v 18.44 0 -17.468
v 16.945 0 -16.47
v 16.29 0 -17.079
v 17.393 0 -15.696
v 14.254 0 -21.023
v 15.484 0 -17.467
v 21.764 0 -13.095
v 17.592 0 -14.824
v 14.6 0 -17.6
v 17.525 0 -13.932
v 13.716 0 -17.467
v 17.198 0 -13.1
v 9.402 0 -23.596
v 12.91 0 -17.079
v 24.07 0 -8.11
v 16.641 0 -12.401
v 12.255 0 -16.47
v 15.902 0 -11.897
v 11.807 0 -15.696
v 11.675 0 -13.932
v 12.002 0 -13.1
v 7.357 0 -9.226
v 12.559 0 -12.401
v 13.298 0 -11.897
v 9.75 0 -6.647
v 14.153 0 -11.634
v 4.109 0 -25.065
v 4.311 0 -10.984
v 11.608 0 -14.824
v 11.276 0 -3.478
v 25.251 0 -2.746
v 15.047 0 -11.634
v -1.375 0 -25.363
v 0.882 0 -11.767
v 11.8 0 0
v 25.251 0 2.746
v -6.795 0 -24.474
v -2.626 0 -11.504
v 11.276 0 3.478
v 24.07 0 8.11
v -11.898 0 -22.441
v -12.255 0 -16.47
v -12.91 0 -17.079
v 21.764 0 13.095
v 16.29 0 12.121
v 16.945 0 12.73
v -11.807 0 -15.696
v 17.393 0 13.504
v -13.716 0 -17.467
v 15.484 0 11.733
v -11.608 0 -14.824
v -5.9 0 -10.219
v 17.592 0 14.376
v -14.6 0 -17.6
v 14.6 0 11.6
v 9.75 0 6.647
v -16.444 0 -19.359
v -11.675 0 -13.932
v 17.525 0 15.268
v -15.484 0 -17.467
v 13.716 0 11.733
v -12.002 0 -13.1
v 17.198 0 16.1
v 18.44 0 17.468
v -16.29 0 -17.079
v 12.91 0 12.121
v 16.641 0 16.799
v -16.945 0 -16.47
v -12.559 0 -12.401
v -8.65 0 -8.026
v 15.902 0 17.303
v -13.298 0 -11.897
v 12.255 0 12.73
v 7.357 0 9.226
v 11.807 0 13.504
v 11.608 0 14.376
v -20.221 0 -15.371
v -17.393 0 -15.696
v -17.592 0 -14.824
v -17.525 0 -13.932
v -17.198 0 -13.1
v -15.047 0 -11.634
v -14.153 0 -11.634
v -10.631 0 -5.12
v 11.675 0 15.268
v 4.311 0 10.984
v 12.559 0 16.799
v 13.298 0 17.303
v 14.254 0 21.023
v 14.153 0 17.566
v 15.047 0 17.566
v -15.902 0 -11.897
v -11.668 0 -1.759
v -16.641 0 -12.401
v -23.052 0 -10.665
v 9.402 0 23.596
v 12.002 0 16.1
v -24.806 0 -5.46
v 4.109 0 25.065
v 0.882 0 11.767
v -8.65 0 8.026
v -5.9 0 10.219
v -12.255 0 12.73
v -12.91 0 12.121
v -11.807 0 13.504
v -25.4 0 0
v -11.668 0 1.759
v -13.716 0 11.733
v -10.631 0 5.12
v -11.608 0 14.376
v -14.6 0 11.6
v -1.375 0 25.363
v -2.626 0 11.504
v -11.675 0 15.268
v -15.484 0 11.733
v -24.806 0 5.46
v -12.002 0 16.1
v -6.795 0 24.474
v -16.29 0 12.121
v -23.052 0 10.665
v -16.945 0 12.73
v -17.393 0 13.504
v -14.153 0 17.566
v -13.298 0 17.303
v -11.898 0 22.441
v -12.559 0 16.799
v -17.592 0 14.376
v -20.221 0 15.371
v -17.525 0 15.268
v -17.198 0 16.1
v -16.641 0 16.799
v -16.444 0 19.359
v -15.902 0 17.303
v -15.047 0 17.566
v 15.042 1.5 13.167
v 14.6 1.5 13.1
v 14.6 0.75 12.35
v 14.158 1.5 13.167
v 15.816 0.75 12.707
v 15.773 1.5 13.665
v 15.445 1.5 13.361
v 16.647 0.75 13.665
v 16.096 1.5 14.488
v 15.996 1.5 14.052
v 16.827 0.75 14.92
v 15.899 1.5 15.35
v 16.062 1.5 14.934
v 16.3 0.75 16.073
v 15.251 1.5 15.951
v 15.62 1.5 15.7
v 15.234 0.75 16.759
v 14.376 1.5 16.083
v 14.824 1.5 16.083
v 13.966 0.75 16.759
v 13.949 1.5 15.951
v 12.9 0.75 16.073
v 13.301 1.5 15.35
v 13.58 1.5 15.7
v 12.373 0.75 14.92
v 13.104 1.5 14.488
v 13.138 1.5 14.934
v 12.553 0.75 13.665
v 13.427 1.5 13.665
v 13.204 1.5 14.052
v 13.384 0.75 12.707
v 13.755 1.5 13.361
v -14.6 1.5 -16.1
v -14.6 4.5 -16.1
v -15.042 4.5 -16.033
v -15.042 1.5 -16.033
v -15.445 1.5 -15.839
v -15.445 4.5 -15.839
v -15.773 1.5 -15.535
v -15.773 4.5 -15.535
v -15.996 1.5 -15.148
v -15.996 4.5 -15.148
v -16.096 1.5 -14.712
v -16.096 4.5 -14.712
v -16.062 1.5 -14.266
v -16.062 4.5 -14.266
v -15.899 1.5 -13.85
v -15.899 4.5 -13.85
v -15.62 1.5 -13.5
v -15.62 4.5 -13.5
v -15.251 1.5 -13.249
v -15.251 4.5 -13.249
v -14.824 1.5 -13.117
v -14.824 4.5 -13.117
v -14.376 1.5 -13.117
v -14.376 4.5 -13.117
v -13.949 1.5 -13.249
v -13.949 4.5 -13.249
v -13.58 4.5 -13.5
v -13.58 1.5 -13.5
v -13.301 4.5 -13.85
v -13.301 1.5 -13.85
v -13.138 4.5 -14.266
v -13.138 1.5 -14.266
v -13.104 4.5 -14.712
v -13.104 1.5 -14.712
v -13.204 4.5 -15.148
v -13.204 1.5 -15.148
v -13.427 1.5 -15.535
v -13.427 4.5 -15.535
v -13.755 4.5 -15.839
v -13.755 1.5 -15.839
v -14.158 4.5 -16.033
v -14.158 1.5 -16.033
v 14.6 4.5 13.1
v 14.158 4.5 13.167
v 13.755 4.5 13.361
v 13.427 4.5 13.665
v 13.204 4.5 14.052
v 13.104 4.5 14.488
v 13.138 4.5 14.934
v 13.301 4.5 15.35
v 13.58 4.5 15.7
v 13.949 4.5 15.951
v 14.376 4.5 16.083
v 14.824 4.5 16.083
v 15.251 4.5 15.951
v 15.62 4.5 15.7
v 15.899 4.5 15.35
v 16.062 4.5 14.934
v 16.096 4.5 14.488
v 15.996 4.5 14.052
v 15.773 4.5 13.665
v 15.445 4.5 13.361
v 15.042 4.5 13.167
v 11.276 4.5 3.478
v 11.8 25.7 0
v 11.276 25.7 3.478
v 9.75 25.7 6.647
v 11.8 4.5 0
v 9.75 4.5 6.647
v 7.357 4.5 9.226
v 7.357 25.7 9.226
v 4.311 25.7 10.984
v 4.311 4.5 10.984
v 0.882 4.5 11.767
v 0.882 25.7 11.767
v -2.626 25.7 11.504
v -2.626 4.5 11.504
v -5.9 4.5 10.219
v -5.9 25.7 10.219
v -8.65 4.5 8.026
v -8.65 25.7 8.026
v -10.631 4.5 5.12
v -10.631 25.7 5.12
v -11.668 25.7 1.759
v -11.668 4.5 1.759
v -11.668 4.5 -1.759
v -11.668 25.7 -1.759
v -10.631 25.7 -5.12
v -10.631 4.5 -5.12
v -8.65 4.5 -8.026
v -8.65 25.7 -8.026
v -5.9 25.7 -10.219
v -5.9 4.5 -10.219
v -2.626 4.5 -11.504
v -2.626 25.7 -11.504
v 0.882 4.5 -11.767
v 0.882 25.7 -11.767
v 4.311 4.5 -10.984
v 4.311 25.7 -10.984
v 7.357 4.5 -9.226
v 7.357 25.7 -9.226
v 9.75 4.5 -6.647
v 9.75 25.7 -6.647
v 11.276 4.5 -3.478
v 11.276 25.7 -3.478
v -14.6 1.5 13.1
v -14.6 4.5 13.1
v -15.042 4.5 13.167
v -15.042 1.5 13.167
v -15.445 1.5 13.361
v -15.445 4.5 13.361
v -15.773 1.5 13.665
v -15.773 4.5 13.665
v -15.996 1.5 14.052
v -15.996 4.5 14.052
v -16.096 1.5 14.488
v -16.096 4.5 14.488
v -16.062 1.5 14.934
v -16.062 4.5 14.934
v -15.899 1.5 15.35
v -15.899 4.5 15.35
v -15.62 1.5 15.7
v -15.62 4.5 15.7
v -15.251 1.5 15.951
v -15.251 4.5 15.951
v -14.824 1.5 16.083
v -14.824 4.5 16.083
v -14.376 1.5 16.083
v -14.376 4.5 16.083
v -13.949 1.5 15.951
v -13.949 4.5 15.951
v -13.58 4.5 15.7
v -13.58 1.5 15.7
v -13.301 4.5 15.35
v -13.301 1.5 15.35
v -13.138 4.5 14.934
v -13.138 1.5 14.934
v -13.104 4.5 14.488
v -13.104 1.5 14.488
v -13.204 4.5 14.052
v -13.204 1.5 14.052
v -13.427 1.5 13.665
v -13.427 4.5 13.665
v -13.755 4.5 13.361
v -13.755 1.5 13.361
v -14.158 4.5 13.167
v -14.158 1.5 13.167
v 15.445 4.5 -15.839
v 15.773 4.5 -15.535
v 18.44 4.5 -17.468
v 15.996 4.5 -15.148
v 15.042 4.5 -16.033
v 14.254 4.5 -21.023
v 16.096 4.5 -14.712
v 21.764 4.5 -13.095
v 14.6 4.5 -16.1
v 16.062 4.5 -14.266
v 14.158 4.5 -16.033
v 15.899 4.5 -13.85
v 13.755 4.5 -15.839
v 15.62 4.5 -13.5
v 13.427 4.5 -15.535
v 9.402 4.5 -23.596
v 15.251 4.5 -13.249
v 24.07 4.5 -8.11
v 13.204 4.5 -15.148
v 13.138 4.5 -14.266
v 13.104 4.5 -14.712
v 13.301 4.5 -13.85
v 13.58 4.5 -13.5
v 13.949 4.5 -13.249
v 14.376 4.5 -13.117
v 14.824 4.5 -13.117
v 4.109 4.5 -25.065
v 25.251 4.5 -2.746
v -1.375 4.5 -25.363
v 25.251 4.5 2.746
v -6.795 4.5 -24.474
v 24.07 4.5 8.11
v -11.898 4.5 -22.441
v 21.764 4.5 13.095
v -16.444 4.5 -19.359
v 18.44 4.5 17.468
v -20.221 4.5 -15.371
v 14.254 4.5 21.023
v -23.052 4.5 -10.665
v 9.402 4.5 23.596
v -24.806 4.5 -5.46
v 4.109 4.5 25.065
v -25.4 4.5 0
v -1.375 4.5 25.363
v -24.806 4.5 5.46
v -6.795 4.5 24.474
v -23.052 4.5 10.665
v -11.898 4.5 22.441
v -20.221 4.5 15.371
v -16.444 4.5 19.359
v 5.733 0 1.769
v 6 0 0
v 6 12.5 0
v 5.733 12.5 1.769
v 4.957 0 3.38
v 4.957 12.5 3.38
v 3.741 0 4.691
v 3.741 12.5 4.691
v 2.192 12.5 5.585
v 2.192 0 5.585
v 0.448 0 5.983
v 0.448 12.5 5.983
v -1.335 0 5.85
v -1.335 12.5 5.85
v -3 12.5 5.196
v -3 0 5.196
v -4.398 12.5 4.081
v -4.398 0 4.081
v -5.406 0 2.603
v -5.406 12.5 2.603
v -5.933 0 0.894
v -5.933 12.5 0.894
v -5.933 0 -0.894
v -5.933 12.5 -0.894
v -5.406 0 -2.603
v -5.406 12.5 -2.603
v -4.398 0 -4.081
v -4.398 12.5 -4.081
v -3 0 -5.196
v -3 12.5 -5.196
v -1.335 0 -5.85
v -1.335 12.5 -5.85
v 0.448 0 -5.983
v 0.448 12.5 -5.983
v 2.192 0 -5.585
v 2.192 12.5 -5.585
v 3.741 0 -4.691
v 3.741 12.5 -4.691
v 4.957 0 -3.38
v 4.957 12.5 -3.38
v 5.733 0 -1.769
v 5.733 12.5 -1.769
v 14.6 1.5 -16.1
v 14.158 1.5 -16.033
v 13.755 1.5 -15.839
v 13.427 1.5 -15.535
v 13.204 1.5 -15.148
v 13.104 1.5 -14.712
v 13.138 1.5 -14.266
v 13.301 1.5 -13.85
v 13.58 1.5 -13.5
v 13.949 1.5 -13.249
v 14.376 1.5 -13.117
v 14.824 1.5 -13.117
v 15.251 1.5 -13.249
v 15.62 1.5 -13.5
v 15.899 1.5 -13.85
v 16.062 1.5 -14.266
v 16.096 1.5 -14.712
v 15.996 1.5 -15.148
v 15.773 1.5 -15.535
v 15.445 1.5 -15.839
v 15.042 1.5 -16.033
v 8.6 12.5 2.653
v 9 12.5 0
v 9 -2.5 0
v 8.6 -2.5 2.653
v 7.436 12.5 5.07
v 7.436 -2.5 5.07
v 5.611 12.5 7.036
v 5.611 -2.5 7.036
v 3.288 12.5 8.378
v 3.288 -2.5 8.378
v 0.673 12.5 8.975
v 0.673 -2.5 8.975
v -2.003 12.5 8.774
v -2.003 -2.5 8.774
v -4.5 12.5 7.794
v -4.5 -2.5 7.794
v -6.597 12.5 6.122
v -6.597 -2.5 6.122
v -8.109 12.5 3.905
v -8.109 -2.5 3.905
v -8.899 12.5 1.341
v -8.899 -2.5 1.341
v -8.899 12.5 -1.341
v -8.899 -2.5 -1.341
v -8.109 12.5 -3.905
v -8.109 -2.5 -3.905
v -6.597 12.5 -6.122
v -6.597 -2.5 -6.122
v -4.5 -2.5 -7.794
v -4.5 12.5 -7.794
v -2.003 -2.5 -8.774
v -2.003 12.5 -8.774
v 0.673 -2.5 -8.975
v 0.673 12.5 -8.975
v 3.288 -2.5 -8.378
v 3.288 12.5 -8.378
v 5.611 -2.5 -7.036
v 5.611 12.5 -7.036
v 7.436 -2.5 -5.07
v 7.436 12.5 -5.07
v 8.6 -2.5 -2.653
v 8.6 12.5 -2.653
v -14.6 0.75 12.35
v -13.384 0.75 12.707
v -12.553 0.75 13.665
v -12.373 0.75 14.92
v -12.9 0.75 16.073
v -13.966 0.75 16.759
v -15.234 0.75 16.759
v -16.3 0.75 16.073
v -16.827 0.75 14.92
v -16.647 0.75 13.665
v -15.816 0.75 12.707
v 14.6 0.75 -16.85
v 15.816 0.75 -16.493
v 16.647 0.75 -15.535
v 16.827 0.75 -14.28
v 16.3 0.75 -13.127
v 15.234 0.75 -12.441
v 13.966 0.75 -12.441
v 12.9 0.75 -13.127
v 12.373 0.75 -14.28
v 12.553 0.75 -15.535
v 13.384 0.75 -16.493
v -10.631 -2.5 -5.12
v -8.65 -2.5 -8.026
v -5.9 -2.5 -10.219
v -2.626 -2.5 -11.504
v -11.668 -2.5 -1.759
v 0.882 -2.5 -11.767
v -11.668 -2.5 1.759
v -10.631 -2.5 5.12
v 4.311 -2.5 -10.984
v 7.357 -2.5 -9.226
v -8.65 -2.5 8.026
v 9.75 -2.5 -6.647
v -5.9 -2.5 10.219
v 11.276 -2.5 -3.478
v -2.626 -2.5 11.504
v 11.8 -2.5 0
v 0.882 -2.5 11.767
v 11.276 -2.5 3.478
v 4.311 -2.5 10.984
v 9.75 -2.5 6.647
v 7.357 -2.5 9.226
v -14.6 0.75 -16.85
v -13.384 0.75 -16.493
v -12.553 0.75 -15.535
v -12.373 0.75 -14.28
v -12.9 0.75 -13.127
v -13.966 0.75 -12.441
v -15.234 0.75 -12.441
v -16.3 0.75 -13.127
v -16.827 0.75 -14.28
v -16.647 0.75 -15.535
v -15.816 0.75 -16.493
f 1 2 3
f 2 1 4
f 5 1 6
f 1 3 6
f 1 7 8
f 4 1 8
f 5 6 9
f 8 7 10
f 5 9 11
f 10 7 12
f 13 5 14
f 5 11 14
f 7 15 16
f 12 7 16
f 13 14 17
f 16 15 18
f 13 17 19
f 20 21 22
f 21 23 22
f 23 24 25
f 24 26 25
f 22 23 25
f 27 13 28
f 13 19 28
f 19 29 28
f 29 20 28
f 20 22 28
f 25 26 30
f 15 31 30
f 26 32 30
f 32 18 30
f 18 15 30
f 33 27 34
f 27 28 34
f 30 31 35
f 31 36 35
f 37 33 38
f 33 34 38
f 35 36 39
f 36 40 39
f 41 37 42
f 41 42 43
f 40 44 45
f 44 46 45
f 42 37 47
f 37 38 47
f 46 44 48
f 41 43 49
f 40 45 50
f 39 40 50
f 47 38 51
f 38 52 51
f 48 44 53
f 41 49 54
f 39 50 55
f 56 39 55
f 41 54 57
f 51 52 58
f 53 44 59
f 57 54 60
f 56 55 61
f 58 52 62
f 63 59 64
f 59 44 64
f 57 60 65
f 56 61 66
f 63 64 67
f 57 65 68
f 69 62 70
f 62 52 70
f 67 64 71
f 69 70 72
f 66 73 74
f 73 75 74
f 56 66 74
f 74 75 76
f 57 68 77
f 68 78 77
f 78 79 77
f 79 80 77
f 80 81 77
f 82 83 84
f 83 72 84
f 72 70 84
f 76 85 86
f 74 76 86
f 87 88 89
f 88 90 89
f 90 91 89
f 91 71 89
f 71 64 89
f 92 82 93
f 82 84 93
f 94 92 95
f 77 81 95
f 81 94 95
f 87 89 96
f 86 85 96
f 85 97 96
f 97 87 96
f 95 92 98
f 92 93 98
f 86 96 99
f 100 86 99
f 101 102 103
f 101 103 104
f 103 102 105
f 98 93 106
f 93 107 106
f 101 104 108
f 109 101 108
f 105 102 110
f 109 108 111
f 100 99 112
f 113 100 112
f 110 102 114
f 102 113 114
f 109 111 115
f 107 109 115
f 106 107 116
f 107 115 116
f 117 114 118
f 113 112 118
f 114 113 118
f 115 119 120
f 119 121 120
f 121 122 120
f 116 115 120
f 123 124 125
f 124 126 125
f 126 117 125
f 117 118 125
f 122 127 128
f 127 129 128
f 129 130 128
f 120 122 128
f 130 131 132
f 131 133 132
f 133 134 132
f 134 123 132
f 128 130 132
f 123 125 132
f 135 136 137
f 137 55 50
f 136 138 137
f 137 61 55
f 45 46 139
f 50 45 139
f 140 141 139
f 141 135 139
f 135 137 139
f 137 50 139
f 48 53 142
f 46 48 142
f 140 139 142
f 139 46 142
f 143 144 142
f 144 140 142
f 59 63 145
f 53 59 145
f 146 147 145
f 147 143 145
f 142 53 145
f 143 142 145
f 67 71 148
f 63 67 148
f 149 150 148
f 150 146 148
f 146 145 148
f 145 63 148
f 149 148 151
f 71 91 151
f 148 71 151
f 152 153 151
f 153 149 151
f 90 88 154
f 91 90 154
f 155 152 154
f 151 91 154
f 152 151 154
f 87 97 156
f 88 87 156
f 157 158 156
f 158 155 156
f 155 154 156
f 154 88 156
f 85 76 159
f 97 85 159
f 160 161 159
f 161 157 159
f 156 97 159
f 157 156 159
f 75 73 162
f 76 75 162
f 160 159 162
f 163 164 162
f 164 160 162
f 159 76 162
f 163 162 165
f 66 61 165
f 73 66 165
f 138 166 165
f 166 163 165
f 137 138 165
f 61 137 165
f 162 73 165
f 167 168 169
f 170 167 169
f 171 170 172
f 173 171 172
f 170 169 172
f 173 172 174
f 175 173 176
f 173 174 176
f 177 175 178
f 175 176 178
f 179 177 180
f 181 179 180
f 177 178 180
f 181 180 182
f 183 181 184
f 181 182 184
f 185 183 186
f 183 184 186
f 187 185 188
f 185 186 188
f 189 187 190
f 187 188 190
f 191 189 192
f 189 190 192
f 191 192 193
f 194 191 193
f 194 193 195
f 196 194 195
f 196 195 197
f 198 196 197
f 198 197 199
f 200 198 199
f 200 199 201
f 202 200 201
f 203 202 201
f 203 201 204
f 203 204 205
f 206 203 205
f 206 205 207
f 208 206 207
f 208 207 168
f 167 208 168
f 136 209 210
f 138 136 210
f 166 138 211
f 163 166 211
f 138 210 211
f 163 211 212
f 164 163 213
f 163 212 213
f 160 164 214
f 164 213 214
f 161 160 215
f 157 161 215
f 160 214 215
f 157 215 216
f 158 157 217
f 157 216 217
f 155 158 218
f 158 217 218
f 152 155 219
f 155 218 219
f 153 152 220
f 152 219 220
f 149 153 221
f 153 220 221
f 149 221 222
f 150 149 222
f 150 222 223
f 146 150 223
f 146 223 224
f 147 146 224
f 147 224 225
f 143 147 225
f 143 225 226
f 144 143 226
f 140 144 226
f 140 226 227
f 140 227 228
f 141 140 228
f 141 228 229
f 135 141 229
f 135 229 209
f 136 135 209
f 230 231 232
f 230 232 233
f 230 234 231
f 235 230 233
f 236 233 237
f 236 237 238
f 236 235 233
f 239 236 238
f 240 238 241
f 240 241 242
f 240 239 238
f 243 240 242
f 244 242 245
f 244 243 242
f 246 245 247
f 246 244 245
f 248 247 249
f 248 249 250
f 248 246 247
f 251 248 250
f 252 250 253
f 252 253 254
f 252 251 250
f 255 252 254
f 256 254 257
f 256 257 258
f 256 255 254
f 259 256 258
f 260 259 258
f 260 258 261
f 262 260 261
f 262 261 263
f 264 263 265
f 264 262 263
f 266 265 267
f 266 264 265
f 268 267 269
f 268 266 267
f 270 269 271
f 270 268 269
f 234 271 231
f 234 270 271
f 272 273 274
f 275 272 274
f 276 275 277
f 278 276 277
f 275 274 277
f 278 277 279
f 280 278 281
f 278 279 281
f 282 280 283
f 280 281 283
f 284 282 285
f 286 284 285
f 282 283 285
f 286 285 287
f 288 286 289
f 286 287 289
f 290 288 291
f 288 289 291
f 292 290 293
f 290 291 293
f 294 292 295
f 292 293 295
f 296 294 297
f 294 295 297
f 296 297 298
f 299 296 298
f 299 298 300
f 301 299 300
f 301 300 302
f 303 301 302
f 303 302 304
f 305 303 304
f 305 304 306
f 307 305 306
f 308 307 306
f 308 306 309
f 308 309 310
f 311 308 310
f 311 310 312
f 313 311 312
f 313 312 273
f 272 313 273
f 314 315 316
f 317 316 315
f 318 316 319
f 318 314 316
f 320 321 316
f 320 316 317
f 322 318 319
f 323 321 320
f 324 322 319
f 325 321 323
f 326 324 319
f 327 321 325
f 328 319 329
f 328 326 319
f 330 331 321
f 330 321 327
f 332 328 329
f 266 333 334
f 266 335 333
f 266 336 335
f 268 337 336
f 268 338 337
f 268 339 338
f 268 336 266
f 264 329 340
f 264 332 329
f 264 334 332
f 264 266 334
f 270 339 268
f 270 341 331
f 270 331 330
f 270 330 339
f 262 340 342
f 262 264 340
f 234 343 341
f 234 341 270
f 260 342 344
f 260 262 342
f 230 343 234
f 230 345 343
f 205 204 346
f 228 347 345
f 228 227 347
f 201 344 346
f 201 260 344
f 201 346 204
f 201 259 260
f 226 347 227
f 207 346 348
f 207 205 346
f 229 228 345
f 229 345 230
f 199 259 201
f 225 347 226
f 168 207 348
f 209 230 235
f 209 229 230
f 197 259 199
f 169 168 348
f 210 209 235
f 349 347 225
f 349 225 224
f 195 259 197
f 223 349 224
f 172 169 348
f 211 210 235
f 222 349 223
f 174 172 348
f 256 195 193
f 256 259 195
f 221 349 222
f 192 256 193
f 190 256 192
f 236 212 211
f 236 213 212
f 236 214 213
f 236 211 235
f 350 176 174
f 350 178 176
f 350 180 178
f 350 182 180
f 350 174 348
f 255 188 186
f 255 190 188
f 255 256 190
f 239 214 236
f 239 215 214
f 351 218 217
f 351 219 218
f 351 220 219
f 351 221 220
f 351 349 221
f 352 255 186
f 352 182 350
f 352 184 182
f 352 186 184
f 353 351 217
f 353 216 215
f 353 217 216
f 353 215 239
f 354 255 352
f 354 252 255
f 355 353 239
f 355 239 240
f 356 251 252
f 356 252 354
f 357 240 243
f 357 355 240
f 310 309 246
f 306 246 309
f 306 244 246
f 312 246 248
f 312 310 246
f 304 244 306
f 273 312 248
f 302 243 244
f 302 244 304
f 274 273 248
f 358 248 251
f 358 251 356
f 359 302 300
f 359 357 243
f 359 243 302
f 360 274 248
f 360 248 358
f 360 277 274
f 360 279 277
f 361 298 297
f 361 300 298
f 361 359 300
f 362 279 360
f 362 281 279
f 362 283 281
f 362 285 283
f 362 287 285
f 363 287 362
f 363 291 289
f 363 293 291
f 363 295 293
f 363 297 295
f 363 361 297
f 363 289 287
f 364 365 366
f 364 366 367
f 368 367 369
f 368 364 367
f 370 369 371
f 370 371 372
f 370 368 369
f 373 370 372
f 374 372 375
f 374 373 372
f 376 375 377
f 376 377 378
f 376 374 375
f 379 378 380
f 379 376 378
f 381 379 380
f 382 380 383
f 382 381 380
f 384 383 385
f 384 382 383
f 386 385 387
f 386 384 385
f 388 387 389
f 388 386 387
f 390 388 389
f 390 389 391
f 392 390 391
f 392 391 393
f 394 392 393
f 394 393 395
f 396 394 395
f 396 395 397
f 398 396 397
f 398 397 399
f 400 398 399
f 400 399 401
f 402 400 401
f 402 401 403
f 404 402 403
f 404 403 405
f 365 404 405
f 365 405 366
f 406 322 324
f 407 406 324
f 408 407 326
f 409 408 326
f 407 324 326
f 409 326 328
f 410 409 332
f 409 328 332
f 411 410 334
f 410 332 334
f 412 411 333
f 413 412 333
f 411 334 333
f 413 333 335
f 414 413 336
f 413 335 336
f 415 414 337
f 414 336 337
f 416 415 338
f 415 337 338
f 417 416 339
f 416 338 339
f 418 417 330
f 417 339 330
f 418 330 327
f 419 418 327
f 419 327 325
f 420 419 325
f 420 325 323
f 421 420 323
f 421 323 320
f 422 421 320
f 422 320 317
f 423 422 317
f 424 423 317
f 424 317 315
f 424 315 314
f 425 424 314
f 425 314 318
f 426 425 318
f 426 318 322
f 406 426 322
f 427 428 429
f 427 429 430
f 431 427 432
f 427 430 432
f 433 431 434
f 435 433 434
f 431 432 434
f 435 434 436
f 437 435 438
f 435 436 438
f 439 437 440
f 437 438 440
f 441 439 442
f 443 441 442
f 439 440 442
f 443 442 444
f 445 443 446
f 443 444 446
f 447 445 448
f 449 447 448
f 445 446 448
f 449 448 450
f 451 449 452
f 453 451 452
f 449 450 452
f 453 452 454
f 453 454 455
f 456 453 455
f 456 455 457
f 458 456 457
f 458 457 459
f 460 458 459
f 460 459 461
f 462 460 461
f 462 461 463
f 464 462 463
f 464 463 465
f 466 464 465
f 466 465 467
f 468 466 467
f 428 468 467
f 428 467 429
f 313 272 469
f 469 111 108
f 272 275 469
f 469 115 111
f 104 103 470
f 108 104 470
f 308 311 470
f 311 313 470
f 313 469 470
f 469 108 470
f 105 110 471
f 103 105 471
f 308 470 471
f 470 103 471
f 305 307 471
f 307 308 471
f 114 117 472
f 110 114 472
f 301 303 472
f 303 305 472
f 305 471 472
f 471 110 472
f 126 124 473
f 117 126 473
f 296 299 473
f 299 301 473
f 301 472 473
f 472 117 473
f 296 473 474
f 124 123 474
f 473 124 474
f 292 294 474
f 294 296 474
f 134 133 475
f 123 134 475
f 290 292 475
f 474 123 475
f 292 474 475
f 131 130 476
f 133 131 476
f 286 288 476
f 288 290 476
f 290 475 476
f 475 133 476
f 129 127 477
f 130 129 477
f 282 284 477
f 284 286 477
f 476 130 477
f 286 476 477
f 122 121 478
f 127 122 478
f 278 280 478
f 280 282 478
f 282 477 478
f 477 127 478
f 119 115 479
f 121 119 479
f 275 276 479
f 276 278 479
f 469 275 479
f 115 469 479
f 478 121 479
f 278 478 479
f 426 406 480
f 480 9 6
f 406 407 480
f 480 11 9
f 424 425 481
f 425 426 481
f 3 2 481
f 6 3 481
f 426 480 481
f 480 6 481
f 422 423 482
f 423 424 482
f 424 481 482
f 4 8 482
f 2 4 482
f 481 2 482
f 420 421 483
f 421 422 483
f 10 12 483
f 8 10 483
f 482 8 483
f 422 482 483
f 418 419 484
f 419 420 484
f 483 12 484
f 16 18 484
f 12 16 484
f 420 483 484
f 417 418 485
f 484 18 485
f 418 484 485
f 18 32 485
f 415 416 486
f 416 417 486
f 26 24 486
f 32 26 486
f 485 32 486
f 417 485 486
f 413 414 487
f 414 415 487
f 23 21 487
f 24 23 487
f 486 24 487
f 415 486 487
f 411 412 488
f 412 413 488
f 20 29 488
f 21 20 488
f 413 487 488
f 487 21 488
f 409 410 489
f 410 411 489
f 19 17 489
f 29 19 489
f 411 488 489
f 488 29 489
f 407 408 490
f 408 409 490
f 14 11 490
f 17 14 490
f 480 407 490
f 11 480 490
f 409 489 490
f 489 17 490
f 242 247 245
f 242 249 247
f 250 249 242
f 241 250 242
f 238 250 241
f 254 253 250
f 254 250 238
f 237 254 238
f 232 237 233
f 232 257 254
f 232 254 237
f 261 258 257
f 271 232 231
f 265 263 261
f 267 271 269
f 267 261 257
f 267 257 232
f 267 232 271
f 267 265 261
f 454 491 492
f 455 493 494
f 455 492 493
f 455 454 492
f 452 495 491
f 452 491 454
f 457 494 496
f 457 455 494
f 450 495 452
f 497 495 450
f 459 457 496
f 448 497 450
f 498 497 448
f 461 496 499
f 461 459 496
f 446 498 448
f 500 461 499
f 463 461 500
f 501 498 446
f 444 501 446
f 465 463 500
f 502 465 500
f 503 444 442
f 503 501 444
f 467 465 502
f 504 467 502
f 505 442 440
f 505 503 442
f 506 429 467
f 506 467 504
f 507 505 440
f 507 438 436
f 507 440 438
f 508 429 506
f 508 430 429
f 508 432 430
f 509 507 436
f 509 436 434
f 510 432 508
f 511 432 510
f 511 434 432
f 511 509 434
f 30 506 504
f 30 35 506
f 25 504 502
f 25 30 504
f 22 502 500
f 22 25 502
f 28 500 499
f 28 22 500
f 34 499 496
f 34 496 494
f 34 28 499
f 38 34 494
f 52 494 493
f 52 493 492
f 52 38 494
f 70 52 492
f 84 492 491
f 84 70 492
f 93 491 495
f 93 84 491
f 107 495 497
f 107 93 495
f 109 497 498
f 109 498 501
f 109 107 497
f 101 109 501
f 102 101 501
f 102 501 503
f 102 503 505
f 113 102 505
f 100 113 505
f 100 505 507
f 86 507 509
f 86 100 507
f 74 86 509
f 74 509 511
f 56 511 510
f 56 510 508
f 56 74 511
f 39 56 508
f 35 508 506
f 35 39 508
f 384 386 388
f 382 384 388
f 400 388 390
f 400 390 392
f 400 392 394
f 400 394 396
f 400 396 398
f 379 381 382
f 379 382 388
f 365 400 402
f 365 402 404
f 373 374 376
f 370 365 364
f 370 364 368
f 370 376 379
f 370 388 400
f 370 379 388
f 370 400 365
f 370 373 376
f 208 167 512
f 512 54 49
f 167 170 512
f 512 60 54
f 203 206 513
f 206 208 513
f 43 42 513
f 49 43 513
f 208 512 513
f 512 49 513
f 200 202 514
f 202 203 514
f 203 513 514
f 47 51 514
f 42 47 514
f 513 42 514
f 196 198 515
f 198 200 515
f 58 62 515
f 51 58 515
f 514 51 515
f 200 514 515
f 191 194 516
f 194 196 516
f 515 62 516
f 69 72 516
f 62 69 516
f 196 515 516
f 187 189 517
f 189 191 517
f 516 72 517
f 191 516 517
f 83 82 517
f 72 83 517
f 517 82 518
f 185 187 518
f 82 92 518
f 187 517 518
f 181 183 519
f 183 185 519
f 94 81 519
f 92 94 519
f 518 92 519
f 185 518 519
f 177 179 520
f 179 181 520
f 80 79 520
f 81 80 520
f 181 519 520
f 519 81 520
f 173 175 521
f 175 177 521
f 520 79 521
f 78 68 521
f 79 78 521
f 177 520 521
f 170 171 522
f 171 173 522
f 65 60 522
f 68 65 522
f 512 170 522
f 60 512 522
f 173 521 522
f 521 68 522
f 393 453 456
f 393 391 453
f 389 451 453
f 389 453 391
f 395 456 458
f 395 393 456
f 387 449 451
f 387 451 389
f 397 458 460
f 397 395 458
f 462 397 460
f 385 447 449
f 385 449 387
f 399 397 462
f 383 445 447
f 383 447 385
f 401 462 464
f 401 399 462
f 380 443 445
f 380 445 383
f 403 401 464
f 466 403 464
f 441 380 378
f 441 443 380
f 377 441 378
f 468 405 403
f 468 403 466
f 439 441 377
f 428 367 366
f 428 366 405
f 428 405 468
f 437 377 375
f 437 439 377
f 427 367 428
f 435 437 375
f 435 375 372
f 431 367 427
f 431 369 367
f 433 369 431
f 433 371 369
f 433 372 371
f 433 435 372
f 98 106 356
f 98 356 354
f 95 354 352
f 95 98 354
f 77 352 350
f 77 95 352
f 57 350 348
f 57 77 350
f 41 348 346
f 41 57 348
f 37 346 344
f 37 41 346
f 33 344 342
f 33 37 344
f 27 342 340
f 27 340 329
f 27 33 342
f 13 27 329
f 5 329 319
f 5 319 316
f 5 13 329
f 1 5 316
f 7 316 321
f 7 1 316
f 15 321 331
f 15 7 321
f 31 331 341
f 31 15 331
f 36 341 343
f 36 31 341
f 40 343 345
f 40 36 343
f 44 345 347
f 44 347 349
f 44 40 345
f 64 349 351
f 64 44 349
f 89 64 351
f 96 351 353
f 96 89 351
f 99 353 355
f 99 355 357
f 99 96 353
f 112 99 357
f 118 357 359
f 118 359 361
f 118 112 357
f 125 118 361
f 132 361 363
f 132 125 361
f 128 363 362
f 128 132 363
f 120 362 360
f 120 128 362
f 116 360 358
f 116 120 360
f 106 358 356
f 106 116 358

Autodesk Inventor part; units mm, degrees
ref_plane "YZ Plane" through (0, 0, 0) normal (1, 0, 0) x (0, 1, 0)
ref_plane "XZ Plane" through (0, 0, 0) normal (0, 1, 0) x (-1, 0, 0)
ref_plane "XY Plane" through (0, 0, 0) normal (0, 0, 1) x (1, 0, 0)
sketch "Skizze1" plane through (0, 0, 0) normal (0, 1, 0) x (-1, 0, 0)
  circle A0 centre (0, 0) radius 25.4
  dimension "d0" = 50.8
extrude "Extrusion1" add sketch "Skizze1" along normal blind 4.5
sketch "Skizze2" plane through (0, 0, 0) normal (0, -1, 0) x (1, 0, 0)
  circle A0 centre (0, 0) radius 25.4 projected
  line L0 (-14.6, 14.6) -> (14.6, 14.6) construction
  line L1 (14.6, 14.6) -> (14.6, -14.6) construction
  line L2 (14.6, -14.6) -> (-14.6, -14.6) construction
  line L3 (-14.6, -14.6) -> (-14.6, 14.6) construction
  line L4 (0, 0) -> (14.6, 0) construction
  line L5 (0, 0) -> (0, 14.6) construction
  dimension "d3" = 29.2
  dimension "d4" = 29.2
hole "Bohrung1" at (-14.6, 0, 14.6) at (14.6, 0, 14.6) at (14.6, 0, -14.6) at (-14.6, 0, -14.6) direction (0, 1, 0) diameter 3 end through all countersink diameter 6 countersink angle 90
sketch "Skizze3" plane through (0, 0, 0) normal (0, -1, 0) x (1, 0, 0)
  circle A0 centre (0, 0) radius 25.4 projected
  circle A1 centre (0, 0) radius 11.8
  dimension "d12" = 23.6
extrude "Extrusion2" add sketch "Skizze3" along normal blind 2.5 contours A1
sketch "Skizze4" plane through (0, 4.5, 0) normal (0, 1, 0) x (1, 0, 0)
  circle A0 centre (0, 0) radius 25.4 projected
  circle A1 centre (0, 0) radius 25.4 projected
  circle A2 centre (0, 0) radius 11.8
  dimension "d15" = 23.6
extrude "Extrusion3" add sketch "Skizze4" along normal blind 21.2 contours A2
sketch "Skizze5" plane through (0, -2.5, 0) normal (0, -1, 0) x (1, 0, 0)
  circle A0 centre (0, 0) radius 11.8 projected
  circle A1 centre (0, 0) radius 9
  circle A2 centre (0, 0) radius 6
  dimension "d18" = 18
  dimension "d19" = 12
extrude "Extrusion4" cut sketch "Skizze5" against normal blind 15 contours A1
move faces "Verschieben1" translate (0, 2.5, 0) faces at (-0.7092, -2.5, 1.4219)
properties part number "anschluss_strom"
